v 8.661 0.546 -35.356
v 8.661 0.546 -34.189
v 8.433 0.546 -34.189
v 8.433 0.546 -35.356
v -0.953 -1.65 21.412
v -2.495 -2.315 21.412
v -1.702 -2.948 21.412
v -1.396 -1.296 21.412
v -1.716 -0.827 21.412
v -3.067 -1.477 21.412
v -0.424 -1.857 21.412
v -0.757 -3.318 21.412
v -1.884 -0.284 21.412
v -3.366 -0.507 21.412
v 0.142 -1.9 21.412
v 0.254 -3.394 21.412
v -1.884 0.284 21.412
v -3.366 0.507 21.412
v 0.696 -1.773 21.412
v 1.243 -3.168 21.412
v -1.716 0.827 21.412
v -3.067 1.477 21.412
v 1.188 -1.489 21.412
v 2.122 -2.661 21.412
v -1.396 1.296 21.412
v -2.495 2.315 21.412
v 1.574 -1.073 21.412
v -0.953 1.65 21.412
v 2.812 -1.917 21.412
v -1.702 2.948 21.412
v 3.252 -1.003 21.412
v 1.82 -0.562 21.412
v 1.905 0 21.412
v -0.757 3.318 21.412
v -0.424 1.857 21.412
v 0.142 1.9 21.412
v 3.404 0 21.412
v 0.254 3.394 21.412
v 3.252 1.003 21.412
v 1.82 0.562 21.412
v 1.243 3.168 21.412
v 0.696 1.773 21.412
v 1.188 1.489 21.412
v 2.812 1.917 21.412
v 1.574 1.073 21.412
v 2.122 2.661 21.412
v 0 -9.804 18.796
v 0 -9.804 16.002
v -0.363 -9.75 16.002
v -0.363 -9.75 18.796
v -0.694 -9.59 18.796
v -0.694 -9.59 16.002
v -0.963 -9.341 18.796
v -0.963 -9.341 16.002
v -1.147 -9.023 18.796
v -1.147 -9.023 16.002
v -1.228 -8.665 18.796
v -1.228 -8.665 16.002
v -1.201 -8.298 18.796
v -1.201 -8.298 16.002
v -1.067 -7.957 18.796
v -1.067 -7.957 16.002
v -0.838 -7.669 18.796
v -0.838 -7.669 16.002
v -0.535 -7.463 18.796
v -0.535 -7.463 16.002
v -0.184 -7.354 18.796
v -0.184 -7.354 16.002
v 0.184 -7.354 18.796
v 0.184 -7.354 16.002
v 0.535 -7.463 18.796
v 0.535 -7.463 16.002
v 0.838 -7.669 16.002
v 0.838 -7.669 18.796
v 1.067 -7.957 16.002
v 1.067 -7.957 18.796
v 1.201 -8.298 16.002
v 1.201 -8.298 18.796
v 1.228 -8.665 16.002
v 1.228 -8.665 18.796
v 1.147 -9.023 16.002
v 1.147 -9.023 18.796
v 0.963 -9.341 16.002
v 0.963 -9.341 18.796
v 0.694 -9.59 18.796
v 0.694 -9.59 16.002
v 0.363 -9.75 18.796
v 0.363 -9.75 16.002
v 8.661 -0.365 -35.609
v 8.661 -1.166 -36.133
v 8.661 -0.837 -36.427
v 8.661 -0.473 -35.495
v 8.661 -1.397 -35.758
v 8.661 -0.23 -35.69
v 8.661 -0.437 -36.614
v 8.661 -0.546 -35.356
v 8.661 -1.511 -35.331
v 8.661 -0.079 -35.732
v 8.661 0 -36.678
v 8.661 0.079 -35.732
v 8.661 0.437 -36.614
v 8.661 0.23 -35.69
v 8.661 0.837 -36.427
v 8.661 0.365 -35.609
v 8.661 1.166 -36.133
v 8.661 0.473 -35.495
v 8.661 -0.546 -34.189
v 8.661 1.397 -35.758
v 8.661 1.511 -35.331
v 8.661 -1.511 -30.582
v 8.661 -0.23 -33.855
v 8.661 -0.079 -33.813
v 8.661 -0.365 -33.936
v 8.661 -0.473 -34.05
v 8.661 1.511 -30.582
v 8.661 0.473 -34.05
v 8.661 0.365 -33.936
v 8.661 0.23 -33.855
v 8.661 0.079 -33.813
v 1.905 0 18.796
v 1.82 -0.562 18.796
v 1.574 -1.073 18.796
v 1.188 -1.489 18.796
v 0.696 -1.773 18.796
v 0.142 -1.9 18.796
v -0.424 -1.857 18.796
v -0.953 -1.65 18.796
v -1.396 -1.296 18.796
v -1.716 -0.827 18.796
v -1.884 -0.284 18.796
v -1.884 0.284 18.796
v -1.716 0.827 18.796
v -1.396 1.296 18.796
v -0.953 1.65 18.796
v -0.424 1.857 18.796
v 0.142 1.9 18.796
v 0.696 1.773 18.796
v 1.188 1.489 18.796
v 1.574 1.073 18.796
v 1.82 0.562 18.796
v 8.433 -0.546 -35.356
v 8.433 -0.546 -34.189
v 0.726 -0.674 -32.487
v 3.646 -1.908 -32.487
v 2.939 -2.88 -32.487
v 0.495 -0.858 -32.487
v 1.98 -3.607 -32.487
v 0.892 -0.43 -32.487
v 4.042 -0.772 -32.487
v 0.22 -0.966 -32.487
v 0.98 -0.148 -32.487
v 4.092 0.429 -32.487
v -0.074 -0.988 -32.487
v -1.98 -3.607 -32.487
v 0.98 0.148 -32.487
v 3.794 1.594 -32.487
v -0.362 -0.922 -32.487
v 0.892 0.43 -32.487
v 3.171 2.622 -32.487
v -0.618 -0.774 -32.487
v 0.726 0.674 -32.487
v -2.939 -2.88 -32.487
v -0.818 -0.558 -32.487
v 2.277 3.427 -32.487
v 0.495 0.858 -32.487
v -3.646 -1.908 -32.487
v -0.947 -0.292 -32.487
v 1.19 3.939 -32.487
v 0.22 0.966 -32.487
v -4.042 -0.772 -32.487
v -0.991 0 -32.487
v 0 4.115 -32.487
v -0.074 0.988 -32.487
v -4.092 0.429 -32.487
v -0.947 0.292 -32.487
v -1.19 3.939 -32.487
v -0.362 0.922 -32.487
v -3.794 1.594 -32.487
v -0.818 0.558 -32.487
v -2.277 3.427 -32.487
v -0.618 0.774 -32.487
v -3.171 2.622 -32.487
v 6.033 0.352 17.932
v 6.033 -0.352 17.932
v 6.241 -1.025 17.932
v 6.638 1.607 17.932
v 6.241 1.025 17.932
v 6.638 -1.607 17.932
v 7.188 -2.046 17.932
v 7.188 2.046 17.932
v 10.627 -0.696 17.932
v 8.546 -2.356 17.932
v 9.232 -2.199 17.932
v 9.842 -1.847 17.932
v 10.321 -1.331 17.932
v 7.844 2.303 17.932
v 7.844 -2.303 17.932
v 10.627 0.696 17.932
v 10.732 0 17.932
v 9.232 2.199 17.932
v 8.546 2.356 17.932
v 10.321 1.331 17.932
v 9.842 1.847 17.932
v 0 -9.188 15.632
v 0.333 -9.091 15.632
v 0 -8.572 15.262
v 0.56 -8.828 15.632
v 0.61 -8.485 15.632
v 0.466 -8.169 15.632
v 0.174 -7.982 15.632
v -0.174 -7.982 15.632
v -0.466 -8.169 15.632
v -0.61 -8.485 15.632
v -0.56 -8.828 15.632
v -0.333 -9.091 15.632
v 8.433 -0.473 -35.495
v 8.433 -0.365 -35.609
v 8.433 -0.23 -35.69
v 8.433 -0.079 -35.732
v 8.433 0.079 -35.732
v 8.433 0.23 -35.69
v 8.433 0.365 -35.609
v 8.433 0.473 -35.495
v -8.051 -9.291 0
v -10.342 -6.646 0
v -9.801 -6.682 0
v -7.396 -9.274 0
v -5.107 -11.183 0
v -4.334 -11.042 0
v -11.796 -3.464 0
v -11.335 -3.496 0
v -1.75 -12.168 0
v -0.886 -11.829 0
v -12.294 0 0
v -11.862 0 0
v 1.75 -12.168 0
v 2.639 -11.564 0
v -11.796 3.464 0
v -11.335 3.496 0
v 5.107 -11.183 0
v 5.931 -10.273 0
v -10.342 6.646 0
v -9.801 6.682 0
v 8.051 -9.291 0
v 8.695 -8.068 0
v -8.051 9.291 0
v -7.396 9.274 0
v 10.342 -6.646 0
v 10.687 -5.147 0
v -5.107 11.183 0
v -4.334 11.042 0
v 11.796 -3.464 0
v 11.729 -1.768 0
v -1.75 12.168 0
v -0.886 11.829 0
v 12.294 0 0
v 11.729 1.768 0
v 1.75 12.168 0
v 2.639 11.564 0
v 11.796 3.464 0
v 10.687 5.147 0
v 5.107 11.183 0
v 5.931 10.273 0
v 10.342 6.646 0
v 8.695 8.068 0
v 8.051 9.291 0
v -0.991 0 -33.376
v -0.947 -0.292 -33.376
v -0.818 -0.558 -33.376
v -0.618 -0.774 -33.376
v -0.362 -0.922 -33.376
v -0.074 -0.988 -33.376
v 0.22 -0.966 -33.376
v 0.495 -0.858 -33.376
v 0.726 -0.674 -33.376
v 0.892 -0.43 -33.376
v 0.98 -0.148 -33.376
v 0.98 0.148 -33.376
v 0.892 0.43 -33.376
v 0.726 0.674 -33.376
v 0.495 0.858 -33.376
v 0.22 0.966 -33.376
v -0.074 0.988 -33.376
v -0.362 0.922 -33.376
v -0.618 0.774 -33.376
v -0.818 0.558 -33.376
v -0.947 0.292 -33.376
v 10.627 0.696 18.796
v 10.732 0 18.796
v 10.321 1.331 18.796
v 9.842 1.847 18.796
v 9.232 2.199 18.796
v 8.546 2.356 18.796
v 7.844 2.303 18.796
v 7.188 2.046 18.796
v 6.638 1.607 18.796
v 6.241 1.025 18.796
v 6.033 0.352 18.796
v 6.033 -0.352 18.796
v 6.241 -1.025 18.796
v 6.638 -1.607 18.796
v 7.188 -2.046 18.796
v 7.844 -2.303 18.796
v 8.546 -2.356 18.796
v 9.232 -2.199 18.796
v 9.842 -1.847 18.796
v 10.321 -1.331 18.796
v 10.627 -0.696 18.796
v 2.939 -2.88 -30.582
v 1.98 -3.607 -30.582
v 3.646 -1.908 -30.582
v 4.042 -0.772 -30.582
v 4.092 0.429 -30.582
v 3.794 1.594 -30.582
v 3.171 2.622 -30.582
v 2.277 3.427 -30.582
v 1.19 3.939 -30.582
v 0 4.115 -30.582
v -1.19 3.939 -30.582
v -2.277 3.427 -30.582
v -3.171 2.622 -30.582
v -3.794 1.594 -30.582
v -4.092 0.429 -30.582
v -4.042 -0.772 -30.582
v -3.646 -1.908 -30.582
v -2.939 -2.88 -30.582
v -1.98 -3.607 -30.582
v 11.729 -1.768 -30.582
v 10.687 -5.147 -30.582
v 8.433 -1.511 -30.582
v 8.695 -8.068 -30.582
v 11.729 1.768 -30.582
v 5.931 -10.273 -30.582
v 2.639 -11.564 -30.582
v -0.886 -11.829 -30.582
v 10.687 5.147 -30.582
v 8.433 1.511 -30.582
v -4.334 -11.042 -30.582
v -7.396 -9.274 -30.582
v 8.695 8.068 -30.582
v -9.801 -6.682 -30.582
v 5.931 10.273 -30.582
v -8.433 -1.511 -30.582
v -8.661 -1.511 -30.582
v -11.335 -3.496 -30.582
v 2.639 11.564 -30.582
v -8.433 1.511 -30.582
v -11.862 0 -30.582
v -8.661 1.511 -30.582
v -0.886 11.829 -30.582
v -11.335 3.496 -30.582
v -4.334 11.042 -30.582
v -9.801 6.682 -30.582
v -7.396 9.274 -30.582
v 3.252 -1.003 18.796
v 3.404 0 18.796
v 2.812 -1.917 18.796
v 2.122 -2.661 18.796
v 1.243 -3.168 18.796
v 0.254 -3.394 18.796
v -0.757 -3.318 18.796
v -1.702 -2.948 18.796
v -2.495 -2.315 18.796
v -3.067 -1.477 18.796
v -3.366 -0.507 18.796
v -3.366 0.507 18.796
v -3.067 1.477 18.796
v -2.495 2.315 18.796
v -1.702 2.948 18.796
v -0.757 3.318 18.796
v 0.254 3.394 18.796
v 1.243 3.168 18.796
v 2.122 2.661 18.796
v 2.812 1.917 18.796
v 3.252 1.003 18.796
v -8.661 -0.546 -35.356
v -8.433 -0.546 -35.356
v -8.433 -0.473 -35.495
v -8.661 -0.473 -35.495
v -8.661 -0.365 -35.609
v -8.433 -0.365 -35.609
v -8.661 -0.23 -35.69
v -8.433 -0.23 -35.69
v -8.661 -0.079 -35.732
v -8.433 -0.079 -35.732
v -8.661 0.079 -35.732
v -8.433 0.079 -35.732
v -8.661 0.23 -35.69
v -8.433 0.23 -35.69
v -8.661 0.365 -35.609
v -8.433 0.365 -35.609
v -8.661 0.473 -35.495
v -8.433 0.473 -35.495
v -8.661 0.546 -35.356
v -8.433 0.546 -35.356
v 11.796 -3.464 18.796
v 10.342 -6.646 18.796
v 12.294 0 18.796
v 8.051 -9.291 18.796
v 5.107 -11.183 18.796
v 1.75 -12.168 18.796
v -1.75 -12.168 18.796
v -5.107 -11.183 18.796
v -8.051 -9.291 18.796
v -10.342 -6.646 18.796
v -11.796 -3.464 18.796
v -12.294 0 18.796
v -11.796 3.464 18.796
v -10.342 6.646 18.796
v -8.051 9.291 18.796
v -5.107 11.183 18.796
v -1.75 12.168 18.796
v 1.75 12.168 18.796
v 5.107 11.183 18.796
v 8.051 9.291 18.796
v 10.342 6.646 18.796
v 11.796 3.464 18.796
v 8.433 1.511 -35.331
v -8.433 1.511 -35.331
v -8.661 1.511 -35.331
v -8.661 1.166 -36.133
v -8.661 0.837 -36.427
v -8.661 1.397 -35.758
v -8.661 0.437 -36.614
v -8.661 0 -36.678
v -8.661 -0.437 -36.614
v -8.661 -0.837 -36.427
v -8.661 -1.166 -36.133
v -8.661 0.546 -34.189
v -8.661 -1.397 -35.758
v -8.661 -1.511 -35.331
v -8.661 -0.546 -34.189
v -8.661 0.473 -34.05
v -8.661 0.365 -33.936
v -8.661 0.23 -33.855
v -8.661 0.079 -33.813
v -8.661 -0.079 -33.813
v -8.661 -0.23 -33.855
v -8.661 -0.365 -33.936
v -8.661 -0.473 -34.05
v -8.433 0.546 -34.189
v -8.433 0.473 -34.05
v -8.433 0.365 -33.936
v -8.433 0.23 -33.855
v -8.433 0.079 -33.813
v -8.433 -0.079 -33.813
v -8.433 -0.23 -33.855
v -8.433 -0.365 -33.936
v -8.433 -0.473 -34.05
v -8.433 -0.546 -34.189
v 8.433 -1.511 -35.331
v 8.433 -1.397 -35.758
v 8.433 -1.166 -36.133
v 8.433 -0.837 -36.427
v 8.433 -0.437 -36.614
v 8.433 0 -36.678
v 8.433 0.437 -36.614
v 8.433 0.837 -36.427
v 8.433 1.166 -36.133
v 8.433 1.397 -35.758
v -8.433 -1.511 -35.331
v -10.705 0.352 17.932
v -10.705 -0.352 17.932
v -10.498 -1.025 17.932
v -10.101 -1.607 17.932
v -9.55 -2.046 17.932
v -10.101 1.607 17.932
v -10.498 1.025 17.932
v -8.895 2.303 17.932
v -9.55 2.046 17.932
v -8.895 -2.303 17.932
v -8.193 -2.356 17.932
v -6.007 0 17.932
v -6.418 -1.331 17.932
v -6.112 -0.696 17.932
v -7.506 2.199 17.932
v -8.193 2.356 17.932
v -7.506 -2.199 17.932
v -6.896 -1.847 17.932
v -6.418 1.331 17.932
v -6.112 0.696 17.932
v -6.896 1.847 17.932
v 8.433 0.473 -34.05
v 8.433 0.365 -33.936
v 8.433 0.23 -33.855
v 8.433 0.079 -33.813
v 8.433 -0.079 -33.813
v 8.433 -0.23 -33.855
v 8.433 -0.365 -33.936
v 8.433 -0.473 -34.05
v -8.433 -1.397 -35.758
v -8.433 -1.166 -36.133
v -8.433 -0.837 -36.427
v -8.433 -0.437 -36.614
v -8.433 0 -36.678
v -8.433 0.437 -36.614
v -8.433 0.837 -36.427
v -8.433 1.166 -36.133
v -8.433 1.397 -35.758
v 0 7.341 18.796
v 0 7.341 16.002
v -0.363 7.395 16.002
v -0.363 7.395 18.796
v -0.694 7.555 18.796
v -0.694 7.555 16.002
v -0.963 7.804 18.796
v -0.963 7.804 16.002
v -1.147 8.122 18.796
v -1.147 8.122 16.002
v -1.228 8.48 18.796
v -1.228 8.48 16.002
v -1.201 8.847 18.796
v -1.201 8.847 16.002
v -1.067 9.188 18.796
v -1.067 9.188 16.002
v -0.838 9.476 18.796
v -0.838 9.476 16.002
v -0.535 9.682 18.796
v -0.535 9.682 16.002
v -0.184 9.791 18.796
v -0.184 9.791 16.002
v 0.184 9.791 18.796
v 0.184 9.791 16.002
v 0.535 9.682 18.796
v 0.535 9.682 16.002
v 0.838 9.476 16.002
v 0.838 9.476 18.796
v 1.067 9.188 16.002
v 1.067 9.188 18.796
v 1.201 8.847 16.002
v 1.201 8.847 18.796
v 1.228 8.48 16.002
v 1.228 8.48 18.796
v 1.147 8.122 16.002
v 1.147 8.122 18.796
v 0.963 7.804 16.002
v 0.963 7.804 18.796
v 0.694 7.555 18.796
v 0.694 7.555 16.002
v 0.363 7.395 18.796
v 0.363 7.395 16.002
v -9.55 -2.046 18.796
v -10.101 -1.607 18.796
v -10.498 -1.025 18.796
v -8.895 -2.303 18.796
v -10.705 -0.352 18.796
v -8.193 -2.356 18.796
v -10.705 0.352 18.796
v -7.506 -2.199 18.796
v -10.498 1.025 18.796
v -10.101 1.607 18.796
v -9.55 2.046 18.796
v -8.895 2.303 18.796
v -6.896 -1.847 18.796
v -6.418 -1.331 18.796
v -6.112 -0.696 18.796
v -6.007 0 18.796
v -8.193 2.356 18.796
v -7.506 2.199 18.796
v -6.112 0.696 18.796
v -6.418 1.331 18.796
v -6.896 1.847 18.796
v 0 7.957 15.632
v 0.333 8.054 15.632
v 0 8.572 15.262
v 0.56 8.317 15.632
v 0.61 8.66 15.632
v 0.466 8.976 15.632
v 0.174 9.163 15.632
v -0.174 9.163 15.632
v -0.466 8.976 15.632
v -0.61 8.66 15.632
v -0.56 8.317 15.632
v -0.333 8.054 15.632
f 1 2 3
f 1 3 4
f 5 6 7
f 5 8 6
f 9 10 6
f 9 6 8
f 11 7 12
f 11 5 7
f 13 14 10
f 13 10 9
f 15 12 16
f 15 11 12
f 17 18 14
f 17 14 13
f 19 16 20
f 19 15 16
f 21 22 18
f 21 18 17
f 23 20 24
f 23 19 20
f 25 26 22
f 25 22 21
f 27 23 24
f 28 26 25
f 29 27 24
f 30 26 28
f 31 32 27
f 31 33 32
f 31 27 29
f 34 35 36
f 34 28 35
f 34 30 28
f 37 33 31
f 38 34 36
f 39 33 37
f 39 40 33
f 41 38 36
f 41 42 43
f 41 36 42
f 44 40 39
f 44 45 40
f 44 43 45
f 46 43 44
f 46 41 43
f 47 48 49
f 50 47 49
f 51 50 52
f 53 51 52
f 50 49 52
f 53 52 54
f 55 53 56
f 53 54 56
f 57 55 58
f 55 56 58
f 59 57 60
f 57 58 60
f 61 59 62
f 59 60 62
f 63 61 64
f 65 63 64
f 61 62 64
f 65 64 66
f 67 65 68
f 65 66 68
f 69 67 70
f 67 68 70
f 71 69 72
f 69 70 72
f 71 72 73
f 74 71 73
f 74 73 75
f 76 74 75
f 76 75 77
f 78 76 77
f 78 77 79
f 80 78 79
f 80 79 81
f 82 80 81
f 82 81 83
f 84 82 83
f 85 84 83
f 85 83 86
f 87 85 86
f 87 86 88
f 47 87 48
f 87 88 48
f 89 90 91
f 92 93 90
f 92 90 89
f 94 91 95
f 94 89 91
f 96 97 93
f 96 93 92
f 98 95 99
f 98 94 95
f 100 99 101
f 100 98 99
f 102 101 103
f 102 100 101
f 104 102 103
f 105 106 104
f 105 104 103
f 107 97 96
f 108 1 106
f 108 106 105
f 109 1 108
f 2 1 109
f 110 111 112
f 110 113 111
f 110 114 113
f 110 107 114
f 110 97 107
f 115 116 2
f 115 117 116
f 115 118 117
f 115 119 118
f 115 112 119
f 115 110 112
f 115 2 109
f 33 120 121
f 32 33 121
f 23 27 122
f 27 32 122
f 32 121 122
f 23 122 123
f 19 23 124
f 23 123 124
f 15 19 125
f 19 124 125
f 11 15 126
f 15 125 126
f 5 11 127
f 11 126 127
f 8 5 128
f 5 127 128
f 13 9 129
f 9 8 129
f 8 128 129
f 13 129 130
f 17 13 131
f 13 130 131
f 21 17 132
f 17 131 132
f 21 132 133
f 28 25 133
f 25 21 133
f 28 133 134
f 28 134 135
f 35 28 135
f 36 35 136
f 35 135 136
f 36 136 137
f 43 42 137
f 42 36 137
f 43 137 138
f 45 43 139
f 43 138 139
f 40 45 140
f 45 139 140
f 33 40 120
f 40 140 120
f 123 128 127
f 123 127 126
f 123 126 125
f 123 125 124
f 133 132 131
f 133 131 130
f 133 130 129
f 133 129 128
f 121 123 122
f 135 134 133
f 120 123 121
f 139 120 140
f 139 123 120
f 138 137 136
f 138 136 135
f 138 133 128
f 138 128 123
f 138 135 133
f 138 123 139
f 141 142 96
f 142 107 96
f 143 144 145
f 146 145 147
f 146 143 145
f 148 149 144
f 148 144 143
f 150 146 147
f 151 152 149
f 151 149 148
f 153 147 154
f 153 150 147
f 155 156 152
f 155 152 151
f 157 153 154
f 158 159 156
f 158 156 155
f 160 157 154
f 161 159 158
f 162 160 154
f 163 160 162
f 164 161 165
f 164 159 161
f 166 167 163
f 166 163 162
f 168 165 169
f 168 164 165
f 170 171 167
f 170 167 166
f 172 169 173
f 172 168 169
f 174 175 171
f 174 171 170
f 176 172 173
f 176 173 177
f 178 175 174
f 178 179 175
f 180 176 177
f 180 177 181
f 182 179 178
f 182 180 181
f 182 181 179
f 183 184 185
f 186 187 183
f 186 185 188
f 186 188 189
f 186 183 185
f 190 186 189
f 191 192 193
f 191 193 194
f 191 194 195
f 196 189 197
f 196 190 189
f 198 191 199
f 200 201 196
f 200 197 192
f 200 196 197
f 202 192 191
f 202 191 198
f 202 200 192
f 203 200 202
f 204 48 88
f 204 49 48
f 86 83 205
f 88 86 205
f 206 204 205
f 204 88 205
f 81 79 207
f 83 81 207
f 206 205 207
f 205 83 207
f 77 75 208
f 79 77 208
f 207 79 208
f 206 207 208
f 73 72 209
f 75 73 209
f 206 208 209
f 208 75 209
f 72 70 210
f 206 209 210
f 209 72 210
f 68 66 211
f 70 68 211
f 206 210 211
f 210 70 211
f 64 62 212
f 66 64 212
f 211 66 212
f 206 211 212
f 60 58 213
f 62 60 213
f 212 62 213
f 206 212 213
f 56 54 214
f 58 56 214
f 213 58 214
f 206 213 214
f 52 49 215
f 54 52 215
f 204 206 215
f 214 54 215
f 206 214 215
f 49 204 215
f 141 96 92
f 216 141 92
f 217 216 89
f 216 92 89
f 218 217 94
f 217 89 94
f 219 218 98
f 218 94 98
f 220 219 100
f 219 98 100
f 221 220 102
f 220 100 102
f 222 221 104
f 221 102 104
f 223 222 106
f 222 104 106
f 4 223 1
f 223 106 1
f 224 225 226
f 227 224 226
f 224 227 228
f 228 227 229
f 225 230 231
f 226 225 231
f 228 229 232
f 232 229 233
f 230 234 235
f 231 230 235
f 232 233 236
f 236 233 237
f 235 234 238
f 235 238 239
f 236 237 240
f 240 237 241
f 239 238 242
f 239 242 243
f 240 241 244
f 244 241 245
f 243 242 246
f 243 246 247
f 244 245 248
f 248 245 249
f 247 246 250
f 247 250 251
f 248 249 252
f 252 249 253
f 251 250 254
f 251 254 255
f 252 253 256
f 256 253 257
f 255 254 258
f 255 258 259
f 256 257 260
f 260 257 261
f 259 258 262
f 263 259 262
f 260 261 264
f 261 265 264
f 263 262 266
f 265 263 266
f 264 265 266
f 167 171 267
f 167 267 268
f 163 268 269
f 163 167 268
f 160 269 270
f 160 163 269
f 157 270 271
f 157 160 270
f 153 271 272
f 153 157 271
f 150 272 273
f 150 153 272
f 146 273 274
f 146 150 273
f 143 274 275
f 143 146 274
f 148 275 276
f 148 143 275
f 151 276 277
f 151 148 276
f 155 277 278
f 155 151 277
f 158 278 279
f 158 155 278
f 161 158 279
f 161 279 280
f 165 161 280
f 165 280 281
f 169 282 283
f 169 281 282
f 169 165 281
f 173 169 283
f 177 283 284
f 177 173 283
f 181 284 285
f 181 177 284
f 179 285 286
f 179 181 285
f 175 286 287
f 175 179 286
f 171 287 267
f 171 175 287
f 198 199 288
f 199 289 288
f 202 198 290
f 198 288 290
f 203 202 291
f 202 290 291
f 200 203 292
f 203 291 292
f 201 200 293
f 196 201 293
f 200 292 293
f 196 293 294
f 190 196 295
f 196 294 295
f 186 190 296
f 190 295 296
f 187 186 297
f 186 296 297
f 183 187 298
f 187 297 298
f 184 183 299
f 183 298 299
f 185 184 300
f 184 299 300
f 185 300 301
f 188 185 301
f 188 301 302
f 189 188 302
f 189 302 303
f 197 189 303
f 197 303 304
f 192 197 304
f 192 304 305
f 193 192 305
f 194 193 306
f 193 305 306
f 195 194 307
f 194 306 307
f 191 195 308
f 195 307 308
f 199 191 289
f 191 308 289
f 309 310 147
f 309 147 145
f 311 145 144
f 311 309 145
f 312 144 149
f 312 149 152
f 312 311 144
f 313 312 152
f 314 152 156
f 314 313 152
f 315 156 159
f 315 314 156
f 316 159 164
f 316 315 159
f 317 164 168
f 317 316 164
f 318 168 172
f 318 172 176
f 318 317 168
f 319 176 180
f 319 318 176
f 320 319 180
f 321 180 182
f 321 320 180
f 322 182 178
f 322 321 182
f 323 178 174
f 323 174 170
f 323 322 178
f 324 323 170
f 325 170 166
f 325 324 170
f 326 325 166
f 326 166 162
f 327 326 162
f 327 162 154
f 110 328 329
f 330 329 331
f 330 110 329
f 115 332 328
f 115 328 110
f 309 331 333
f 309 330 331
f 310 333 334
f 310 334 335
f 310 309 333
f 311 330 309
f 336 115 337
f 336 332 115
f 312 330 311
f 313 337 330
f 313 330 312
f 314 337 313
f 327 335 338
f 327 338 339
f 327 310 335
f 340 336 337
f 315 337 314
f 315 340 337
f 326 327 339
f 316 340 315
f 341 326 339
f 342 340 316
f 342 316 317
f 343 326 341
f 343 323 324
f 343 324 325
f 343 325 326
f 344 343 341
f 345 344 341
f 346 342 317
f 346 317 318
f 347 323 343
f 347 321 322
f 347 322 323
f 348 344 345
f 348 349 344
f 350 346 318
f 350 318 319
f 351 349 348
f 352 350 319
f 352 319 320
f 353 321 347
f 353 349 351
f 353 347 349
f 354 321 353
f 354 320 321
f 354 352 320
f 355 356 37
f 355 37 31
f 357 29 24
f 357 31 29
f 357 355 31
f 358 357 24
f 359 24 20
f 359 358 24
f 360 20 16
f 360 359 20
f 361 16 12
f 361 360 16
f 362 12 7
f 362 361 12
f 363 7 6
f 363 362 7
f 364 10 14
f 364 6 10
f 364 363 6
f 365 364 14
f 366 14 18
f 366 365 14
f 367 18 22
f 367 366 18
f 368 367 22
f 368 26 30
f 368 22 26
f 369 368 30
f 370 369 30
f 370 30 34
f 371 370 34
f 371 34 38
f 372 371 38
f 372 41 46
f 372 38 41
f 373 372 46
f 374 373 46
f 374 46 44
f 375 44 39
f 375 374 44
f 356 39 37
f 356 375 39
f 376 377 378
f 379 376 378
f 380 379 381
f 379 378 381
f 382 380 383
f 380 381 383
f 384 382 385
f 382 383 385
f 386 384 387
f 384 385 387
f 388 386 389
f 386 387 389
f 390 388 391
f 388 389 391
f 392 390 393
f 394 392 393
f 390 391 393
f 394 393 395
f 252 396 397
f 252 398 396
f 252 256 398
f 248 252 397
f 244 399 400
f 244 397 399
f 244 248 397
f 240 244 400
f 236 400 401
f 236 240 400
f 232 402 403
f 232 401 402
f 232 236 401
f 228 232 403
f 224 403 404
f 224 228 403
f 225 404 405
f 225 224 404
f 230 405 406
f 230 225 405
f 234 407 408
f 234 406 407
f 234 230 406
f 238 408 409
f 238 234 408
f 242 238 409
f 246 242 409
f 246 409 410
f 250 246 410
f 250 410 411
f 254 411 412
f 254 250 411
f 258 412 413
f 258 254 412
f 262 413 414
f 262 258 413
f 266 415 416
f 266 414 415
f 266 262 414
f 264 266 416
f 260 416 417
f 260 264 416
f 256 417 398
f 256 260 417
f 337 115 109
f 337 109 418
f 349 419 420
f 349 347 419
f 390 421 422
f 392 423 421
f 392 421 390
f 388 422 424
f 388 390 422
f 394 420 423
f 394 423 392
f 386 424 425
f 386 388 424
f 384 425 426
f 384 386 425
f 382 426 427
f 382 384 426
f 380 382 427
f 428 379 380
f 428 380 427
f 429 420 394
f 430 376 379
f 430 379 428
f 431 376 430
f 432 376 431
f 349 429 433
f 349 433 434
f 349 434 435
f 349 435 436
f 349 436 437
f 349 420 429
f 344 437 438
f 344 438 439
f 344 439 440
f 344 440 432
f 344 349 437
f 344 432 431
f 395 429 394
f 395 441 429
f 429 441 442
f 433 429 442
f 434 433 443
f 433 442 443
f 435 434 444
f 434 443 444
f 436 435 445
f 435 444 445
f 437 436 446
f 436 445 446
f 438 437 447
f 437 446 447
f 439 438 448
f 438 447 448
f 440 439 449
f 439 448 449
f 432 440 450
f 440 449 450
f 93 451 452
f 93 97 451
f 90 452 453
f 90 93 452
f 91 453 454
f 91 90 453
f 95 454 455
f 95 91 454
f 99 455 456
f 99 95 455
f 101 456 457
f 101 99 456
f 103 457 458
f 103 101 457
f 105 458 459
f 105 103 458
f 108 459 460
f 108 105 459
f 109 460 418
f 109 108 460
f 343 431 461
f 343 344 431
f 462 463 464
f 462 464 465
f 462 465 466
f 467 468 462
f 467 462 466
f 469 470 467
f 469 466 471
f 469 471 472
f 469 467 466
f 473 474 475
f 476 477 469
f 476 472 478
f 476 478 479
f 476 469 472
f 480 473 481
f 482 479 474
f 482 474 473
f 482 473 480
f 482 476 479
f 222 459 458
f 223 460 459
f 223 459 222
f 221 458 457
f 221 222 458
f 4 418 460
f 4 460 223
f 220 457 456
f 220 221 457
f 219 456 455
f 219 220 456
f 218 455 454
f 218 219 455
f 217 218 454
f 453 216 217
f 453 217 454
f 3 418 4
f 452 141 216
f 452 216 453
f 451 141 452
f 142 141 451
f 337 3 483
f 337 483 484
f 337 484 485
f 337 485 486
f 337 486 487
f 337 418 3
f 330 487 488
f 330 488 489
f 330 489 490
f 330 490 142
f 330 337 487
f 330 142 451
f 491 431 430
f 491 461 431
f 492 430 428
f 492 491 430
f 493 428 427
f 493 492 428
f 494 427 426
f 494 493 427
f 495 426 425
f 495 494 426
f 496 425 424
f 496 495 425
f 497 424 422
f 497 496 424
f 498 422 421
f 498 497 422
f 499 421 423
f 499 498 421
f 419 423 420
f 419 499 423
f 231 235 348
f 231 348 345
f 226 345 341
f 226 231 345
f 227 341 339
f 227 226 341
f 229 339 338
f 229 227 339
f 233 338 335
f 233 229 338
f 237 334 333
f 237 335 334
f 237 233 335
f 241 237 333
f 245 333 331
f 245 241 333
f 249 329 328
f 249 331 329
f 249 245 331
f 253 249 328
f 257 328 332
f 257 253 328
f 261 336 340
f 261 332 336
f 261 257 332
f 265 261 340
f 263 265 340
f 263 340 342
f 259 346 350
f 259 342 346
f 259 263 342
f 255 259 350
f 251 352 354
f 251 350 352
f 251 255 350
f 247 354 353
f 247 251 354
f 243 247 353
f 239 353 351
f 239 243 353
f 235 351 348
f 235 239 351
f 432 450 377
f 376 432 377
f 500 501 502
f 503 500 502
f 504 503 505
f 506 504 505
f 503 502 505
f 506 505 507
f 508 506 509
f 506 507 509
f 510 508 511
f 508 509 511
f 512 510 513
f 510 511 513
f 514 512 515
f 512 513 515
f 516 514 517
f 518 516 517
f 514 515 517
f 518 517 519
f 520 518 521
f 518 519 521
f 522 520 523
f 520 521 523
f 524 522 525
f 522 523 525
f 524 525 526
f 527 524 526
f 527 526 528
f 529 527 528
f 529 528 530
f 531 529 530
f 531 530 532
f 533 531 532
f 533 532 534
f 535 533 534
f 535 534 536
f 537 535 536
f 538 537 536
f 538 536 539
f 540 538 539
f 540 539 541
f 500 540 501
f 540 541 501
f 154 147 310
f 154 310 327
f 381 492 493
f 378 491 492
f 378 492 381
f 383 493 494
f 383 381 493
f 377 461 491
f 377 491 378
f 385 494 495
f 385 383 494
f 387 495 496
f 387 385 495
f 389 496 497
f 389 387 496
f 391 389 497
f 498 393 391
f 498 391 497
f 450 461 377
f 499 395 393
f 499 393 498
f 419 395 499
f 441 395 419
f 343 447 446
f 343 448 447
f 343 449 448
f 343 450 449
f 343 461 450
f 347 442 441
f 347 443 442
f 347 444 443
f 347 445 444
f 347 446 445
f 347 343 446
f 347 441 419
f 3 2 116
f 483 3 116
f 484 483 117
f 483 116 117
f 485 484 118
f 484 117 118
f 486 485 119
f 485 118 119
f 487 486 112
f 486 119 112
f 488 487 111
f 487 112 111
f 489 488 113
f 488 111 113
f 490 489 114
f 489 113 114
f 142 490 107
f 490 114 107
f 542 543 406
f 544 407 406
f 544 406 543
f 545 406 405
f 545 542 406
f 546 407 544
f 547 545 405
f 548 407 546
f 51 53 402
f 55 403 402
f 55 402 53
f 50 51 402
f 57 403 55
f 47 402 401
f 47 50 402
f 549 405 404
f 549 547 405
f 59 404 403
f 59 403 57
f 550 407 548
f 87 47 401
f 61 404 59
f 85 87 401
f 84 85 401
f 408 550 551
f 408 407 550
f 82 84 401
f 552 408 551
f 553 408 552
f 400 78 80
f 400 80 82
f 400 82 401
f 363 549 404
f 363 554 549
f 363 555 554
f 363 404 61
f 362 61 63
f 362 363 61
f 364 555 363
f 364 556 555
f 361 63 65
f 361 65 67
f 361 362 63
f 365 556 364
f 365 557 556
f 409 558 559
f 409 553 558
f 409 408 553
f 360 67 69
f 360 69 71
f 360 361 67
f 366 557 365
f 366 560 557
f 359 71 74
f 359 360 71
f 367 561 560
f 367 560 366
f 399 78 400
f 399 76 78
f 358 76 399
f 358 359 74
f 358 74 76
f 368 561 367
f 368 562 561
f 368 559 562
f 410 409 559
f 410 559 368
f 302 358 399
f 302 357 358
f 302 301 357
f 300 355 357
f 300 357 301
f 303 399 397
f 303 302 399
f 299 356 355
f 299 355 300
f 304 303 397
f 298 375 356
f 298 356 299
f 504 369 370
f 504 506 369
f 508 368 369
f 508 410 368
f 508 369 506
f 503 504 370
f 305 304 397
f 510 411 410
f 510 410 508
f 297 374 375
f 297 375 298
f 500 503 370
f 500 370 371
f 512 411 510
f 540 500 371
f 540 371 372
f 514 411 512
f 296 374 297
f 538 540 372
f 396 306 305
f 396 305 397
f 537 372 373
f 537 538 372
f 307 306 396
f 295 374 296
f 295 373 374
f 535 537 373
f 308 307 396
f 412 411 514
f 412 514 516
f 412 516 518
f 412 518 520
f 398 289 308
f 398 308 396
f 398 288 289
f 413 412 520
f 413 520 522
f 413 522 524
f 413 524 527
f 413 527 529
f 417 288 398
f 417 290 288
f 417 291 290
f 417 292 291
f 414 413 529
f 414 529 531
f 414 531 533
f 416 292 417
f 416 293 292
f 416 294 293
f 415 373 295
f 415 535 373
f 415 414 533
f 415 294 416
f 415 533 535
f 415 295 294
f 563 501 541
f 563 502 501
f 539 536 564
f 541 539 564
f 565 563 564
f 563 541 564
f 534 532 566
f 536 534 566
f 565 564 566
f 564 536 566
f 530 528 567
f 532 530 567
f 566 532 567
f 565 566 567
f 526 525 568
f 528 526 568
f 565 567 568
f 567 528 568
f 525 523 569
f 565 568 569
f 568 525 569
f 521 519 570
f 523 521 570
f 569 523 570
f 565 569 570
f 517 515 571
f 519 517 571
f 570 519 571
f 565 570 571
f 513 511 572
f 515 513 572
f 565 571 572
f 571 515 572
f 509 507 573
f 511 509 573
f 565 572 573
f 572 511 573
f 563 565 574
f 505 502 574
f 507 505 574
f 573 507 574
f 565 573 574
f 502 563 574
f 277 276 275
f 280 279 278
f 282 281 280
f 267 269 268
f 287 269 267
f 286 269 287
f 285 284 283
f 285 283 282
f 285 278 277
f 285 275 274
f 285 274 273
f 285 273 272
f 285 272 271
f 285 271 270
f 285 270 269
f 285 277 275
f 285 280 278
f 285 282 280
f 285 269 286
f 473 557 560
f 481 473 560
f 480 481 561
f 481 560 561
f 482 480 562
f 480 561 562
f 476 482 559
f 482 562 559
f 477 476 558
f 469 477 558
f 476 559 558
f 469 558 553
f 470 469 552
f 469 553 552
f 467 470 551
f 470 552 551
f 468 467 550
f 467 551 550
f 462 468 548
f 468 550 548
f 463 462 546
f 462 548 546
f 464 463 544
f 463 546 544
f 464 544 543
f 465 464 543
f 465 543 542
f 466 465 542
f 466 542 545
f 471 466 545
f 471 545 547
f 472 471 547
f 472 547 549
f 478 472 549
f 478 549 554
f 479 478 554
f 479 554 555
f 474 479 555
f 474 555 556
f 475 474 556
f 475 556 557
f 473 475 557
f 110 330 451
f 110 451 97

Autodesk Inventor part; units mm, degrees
ref_plane "YZ Plane" through (0, 0, 0) normal (1, 0, 0) x (0, 1, 0)
ref_plane "XZ Plane" through (0, 0, 0) normal (0, 1, 0) x (-1, 0, 0)
ref_plane "XY Plane" through (0, 0, 0) normal (0, 0, 1) x (1, 0, 0)
sketch "Sketch1" plane through (0, 0, 0) normal (0, 0, 1) x (1, 0, 0)
  circle A0 centre (0, 0) radius 12.2936
  dimension "d0" = 24.5872
extrude "Extrusion1" add sketch "Sketch1" along normal blind 18.796
sketch "Sketch2" plane through (0, 0, 18.796) normal (0, 0, 1) x (1, 0, 0)
  circle A0 centre (0, 0) radius 12.2936 projected
  circle A1 centre (0, 0) radius 3.4036
  circle A2 centre (0, 0) radius 1.905
  dimension "d3" = 6.8072
  dimension "d6" = 3.81
extrude "Extrusion3" add sketch "Sketch2" along normal blind 2.6162 contours A1
sketch "Sketch3" plane through (0, 0, 18.796) normal (0, 0, 1) x (1, 0, 0)
  circle A0 centre (0, 0) radius 12.2936 projected
  point P0 (0, 8.5725)
  point P1 (0, -8.5725)
  dimension "d9" = 17.145
  dimension "d10" = 8.5725
hole "Hole1" at (0, 8.5725, 18.796) at (0, -8.5725, 18.796) direction (0, 0, -1) diameter 2.4638 depth 2.794 tip angle 118
sketch "Sketch4" plane through (0, 0, 0) normal (0, 0, -1) x (-1, 0, 0)
  circle A0 centre (0, 0) radius 12.2936 projected
  circle A1 centre (0, 0) radius 11.8618
  dimension "d18" = 23.7236
extrude "Extrusion4" add sketch "Sketch4" along normal blind 30.5816 contours A1
sketch "Sketch5" plane through (0, 0, -30.5816) normal (0, 0, -1) x (-1, 0, 0)
  circle A0 centre (0, 0) radius 11.8618 projected
  circle A1 centre (0, 0) radius 4.1148
  dimension "d21" = 8.2296
extrude "Extrusion5" add sketch "Sketch5" along normal blind 1.905 contours A1
sketch "Sketch6" plane through (0, 0, -32.4866) normal (0, 0, -1) x (-1, 0, 0)
  circle A0 centre (0, 0) radius 4.1148 projected
  line L0 (-1.9805, -3.6068) -> (1.9805, -3.6068)
  dimension "d24" = 3.6068
  dimension "d25" = 8.2296
extrude "Extrusion6" cut sketch "Sketch6" against normal up to surface (1.905 mm away) contours L0 A0 picked at (-0.407, -3.7143)
sketch "Sketch7" plane through (0, 0, -32.4866) normal (0, 0, -1) x (-1, 0, 0)
  arc A0 (1.9805, -3.6068) -> (-1.9805, -3.6068) centre (0, 0) ccw projected
  circle A1 centre (0, 0) radius 0.9906
  dimension "d28" = 1.9812
extrude "Extrusion7" add sketch "Sketch7" along normal blind 0.889
sketch "Sketch8" plane through (0, 0, -30.5816) normal (0, 0, -1) x (-1, 0, 0)
  arc A0 (1.9805, -3.6068) -> (-1.9805, -3.6068) centre (0, 0) ccw projected
  line L0 (-8.6614, 1.5113) -> (-8.4328, 1.5113)
  line L1 (-8.4328, 1.5113) -> (-8.4328, -1.5113)
  line L2 (-8.4328, -1.5113) -> (-8.6614, -1.5113)
  line L3 (-8.6614, -1.5113) -> (-8.6614, 1.5113)
  line L4 (8.4328, 1.5113) -> (8.6614, 1.5113)
  line L5 (8.6614, 1.5113) -> (8.6614, -1.5113)
  line L6 (8.6614, -1.5113) -> (8.4328, -1.5113)
  line L7 (8.4328, -1.5113) -> (8.4328, 1.5113)
  point P0 (-8.4328, 0)
  point P1 (8.4328, 0)
  dimension "d31" = 0.2286
  dimension "d32" = 16.8656
  dimension "d33" = 3.0226
  dimension "d34" = 8.4328
extrude "Extrusion8" add sketch "Sketch8" along normal blind 6.096
sketch "Sketch9" plane through (8.6614, -1.5113, -30.5816) normal (1, 0, 0) x (0, 0, -1)
  line L0 (0, 0) -> (0, 3.0226) projected
  line L1 (0, 0) -> (6.096, 0) projected
  line L2 (6.096, 3.0226) -> (6.096, 0) projected
  line L3 (0, 3.0226) -> (6.096, 3.0226) projected
  arc A0 (4.7498, 0) -> (4.7498, 3.0226) centre (4.5746, 1.5113) ccw
  point P0 (-30.5816, 1.5113)
  dimension "d37" = 1.3462
extrude "Extrusion9" cut sketch "Sketch9" against normal through all contours A0 L2 L1 | L3 L2 A0
sketch "Sketch10" plane through (8.6614, -1.5113, -30.5816) normal (1, 0, 0) x (0, 0, -1)
  arc A0 (4.7498, 0) -> (4.7498, 3.0226) centre (4.5746, 1.5113) ccw projected
  line L0 (0, 0) -> (4.7498, 0) projected
  arc A1 (4.7747, 0.9652) -> (4.7747, 2.0574) centre (4.5746, 1.5113) ccw
  line L1 (3.6073, 0.9652) -> (4.7747, 0.9652)
  line L2 (3.6073, 2.0574) -> (4.7747, 2.0574)
  arc A2 (3.6073, 2.0574) -> (3.6073, 0.9652) centre (3.8074, 1.5113) ccw
  point P0 (-30.5816, 1.5113)
  dimension "d41" = 0.9398
  dimension "d42" = 0.5816
  dimension "d45" = 0.9652
  dimension "d46" = 0.5816
  dimension "d47" = 1.9304
extrude "Extrusion10" cut sketch "Sketch10" against normal through all
sketch "Sketch11" plane through (0, 0, 18.796) normal (0, 0, 1) x (1, 0, 0)
  circle A0 centre (0, 0) radius 12.2936 projected
  circle A1 centre (-8.3693, 0) radius 2.3622
  circle A2 centre (8.3693, 0) radius 2.3622
  dimension "d50" = 4.7244
  dimension "d51" = 12.0142
  dimension "d53" = 16.7386
  dimension "d54" = 8.3693
extrude "Extrusion11" cut sketch "Sketch11" against normal blind 0.8636 contours A1 | A2
equation "\"d10\" = 0.5 * d9"
equation "\"d34\" = 0.5 * d32"
equation "\"d46\" = d42"
equation "\"d54\" = 0.5 * d53"
properties part number "Motor Body"
